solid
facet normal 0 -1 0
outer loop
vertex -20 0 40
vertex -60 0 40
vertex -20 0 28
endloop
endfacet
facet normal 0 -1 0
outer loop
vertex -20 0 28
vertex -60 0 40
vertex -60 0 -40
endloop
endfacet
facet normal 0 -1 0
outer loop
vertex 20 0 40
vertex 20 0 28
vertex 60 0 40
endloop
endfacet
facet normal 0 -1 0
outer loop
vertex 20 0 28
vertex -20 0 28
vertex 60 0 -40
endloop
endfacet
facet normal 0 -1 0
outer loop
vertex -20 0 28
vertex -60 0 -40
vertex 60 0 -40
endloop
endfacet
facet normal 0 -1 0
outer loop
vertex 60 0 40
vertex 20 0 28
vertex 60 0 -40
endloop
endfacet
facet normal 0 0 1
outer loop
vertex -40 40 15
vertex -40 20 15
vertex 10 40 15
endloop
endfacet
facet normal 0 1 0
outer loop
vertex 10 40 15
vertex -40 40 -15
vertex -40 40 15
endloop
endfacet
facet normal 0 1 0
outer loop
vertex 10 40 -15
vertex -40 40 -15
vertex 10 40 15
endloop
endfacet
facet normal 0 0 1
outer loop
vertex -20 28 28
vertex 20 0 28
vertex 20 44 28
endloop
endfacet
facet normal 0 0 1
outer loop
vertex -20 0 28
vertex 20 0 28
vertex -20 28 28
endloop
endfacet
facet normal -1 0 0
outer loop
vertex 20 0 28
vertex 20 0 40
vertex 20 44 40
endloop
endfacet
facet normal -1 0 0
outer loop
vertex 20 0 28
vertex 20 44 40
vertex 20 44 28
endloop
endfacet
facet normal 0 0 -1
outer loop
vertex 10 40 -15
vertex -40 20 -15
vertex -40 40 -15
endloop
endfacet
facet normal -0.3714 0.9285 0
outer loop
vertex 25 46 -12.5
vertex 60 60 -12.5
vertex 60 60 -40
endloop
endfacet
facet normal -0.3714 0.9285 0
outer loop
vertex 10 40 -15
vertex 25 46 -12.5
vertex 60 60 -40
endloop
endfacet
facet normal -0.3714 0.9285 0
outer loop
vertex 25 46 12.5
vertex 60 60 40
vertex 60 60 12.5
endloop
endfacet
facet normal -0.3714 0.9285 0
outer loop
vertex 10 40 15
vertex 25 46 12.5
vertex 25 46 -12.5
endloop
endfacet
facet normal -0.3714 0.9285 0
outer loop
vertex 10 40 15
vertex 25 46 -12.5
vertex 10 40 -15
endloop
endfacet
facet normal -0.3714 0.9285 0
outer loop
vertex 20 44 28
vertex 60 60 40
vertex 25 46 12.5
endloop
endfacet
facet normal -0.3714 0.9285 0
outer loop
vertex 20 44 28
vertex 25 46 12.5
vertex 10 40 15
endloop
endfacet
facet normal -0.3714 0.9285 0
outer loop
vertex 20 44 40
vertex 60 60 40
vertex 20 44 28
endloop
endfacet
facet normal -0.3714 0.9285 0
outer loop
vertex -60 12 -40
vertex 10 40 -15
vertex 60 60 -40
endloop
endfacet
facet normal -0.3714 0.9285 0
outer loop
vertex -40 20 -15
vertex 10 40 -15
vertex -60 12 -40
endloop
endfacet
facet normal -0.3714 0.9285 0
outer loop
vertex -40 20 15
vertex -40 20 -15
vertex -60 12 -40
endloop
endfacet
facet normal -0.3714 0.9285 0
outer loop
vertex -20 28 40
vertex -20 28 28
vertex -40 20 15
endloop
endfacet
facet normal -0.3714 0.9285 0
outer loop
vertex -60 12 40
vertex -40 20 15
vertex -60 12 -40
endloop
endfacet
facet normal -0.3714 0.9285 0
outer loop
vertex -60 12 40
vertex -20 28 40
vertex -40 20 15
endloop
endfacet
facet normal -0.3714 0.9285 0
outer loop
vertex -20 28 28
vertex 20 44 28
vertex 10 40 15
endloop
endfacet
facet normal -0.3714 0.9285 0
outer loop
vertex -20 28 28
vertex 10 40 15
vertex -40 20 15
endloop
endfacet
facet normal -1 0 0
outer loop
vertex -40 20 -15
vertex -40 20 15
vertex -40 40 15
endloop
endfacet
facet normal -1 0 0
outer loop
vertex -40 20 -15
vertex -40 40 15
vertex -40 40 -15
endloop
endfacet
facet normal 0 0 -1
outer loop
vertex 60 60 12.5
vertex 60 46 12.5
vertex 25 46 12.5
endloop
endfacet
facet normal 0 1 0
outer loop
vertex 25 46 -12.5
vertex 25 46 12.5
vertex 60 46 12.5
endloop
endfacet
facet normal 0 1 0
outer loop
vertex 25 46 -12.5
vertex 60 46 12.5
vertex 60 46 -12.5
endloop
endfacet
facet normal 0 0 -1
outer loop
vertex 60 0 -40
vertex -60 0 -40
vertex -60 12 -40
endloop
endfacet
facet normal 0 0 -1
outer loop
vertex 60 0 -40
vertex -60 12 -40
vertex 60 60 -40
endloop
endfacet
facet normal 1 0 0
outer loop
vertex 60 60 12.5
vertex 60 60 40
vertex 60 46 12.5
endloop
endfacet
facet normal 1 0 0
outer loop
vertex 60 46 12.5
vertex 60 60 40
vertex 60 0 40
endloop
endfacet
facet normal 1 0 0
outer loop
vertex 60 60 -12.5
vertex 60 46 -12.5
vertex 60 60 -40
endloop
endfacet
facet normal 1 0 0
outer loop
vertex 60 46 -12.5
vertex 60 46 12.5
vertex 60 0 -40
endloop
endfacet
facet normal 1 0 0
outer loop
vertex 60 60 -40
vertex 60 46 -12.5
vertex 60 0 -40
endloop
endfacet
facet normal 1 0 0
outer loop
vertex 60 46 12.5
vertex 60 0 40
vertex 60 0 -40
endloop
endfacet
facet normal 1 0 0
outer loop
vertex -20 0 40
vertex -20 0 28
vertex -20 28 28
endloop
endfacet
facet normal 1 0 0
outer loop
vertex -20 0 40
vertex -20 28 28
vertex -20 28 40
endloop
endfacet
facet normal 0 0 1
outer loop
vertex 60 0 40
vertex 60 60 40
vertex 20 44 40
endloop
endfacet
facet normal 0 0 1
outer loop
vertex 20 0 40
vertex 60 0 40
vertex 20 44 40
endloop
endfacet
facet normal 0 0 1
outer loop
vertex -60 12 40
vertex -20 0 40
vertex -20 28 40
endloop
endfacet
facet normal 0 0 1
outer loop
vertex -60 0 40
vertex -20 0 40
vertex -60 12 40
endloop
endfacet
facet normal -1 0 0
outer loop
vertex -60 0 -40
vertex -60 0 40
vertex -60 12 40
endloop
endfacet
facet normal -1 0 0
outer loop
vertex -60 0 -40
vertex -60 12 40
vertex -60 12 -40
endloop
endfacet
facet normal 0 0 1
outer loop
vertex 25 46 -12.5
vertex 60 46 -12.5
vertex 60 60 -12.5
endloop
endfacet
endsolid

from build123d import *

# Parameters (mm, degrees)
BOSS_EXTRUDE1_DEPTH = 60
CUT_EXTRUDE2_DEPTH  = 40
SKETCH8_W           = 100
SKETCH8_H           = 30
BOSS_EXTRUDE2_DEPTH = 40
SKETCH9_W           = 25
SKETCH9_H           = 14
CUT_EXTRUDE3_DEPTH  = 94.808315196


with BuildPart() as part:
    # Sketch1 → Boss-Extrude1 (new body)
    with BuildSketch(Plane(origin=(0, 0, 0), x_dir=(1, 0, 0), z_dir=(0, 1, 0))):
        Polygon((-20, -28), (-20, -40), (-60, -40), (-60, 40), (60, 40), (60, -40), (20, -40), (20, -28), align=None)
    extrude(amount=BOSS_EXTRUDE1_DEPTH)

    # Sketch7 → Cut-Extrude2 (cut, symmetric)
    with BuildSketch(Plane.XY):
        Polygon((60, 60), (-60, 12), (-60, 60), align=None)
    extrude(amount=CUT_EXTRUDE2_DEPTH, both=True, mode=Mode.SUBTRACT)

    # Sketch8 → Boss-Extrude2 (add)
    with BuildSketch(Plane(origin=(0, 0, 0), x_dir=(1, 0, 0), z_dir=(0, 1, 0))):
        with Locations((10, 0)):
            Rectangle(SKETCH8_W, SKETCH8_H)
    extrude(amount=BOSS_EXTRUDE2_DEPTH)

    # Sketch9 → Cut-Extrude3 (cut, through all)
    with BuildSketch(Plane(origin=(0, 0, 0), x_dir=(0, 0, -1), z_dir=(1, 0, 0))):
        with Locations((0, 53)):
            Rectangle(SKETCH9_W, SKETCH9_H)
    extrude(amount=CUT_EXTRUDE3_DEPTH, mode=Mode.SUBTRACT)


solid = part.part
